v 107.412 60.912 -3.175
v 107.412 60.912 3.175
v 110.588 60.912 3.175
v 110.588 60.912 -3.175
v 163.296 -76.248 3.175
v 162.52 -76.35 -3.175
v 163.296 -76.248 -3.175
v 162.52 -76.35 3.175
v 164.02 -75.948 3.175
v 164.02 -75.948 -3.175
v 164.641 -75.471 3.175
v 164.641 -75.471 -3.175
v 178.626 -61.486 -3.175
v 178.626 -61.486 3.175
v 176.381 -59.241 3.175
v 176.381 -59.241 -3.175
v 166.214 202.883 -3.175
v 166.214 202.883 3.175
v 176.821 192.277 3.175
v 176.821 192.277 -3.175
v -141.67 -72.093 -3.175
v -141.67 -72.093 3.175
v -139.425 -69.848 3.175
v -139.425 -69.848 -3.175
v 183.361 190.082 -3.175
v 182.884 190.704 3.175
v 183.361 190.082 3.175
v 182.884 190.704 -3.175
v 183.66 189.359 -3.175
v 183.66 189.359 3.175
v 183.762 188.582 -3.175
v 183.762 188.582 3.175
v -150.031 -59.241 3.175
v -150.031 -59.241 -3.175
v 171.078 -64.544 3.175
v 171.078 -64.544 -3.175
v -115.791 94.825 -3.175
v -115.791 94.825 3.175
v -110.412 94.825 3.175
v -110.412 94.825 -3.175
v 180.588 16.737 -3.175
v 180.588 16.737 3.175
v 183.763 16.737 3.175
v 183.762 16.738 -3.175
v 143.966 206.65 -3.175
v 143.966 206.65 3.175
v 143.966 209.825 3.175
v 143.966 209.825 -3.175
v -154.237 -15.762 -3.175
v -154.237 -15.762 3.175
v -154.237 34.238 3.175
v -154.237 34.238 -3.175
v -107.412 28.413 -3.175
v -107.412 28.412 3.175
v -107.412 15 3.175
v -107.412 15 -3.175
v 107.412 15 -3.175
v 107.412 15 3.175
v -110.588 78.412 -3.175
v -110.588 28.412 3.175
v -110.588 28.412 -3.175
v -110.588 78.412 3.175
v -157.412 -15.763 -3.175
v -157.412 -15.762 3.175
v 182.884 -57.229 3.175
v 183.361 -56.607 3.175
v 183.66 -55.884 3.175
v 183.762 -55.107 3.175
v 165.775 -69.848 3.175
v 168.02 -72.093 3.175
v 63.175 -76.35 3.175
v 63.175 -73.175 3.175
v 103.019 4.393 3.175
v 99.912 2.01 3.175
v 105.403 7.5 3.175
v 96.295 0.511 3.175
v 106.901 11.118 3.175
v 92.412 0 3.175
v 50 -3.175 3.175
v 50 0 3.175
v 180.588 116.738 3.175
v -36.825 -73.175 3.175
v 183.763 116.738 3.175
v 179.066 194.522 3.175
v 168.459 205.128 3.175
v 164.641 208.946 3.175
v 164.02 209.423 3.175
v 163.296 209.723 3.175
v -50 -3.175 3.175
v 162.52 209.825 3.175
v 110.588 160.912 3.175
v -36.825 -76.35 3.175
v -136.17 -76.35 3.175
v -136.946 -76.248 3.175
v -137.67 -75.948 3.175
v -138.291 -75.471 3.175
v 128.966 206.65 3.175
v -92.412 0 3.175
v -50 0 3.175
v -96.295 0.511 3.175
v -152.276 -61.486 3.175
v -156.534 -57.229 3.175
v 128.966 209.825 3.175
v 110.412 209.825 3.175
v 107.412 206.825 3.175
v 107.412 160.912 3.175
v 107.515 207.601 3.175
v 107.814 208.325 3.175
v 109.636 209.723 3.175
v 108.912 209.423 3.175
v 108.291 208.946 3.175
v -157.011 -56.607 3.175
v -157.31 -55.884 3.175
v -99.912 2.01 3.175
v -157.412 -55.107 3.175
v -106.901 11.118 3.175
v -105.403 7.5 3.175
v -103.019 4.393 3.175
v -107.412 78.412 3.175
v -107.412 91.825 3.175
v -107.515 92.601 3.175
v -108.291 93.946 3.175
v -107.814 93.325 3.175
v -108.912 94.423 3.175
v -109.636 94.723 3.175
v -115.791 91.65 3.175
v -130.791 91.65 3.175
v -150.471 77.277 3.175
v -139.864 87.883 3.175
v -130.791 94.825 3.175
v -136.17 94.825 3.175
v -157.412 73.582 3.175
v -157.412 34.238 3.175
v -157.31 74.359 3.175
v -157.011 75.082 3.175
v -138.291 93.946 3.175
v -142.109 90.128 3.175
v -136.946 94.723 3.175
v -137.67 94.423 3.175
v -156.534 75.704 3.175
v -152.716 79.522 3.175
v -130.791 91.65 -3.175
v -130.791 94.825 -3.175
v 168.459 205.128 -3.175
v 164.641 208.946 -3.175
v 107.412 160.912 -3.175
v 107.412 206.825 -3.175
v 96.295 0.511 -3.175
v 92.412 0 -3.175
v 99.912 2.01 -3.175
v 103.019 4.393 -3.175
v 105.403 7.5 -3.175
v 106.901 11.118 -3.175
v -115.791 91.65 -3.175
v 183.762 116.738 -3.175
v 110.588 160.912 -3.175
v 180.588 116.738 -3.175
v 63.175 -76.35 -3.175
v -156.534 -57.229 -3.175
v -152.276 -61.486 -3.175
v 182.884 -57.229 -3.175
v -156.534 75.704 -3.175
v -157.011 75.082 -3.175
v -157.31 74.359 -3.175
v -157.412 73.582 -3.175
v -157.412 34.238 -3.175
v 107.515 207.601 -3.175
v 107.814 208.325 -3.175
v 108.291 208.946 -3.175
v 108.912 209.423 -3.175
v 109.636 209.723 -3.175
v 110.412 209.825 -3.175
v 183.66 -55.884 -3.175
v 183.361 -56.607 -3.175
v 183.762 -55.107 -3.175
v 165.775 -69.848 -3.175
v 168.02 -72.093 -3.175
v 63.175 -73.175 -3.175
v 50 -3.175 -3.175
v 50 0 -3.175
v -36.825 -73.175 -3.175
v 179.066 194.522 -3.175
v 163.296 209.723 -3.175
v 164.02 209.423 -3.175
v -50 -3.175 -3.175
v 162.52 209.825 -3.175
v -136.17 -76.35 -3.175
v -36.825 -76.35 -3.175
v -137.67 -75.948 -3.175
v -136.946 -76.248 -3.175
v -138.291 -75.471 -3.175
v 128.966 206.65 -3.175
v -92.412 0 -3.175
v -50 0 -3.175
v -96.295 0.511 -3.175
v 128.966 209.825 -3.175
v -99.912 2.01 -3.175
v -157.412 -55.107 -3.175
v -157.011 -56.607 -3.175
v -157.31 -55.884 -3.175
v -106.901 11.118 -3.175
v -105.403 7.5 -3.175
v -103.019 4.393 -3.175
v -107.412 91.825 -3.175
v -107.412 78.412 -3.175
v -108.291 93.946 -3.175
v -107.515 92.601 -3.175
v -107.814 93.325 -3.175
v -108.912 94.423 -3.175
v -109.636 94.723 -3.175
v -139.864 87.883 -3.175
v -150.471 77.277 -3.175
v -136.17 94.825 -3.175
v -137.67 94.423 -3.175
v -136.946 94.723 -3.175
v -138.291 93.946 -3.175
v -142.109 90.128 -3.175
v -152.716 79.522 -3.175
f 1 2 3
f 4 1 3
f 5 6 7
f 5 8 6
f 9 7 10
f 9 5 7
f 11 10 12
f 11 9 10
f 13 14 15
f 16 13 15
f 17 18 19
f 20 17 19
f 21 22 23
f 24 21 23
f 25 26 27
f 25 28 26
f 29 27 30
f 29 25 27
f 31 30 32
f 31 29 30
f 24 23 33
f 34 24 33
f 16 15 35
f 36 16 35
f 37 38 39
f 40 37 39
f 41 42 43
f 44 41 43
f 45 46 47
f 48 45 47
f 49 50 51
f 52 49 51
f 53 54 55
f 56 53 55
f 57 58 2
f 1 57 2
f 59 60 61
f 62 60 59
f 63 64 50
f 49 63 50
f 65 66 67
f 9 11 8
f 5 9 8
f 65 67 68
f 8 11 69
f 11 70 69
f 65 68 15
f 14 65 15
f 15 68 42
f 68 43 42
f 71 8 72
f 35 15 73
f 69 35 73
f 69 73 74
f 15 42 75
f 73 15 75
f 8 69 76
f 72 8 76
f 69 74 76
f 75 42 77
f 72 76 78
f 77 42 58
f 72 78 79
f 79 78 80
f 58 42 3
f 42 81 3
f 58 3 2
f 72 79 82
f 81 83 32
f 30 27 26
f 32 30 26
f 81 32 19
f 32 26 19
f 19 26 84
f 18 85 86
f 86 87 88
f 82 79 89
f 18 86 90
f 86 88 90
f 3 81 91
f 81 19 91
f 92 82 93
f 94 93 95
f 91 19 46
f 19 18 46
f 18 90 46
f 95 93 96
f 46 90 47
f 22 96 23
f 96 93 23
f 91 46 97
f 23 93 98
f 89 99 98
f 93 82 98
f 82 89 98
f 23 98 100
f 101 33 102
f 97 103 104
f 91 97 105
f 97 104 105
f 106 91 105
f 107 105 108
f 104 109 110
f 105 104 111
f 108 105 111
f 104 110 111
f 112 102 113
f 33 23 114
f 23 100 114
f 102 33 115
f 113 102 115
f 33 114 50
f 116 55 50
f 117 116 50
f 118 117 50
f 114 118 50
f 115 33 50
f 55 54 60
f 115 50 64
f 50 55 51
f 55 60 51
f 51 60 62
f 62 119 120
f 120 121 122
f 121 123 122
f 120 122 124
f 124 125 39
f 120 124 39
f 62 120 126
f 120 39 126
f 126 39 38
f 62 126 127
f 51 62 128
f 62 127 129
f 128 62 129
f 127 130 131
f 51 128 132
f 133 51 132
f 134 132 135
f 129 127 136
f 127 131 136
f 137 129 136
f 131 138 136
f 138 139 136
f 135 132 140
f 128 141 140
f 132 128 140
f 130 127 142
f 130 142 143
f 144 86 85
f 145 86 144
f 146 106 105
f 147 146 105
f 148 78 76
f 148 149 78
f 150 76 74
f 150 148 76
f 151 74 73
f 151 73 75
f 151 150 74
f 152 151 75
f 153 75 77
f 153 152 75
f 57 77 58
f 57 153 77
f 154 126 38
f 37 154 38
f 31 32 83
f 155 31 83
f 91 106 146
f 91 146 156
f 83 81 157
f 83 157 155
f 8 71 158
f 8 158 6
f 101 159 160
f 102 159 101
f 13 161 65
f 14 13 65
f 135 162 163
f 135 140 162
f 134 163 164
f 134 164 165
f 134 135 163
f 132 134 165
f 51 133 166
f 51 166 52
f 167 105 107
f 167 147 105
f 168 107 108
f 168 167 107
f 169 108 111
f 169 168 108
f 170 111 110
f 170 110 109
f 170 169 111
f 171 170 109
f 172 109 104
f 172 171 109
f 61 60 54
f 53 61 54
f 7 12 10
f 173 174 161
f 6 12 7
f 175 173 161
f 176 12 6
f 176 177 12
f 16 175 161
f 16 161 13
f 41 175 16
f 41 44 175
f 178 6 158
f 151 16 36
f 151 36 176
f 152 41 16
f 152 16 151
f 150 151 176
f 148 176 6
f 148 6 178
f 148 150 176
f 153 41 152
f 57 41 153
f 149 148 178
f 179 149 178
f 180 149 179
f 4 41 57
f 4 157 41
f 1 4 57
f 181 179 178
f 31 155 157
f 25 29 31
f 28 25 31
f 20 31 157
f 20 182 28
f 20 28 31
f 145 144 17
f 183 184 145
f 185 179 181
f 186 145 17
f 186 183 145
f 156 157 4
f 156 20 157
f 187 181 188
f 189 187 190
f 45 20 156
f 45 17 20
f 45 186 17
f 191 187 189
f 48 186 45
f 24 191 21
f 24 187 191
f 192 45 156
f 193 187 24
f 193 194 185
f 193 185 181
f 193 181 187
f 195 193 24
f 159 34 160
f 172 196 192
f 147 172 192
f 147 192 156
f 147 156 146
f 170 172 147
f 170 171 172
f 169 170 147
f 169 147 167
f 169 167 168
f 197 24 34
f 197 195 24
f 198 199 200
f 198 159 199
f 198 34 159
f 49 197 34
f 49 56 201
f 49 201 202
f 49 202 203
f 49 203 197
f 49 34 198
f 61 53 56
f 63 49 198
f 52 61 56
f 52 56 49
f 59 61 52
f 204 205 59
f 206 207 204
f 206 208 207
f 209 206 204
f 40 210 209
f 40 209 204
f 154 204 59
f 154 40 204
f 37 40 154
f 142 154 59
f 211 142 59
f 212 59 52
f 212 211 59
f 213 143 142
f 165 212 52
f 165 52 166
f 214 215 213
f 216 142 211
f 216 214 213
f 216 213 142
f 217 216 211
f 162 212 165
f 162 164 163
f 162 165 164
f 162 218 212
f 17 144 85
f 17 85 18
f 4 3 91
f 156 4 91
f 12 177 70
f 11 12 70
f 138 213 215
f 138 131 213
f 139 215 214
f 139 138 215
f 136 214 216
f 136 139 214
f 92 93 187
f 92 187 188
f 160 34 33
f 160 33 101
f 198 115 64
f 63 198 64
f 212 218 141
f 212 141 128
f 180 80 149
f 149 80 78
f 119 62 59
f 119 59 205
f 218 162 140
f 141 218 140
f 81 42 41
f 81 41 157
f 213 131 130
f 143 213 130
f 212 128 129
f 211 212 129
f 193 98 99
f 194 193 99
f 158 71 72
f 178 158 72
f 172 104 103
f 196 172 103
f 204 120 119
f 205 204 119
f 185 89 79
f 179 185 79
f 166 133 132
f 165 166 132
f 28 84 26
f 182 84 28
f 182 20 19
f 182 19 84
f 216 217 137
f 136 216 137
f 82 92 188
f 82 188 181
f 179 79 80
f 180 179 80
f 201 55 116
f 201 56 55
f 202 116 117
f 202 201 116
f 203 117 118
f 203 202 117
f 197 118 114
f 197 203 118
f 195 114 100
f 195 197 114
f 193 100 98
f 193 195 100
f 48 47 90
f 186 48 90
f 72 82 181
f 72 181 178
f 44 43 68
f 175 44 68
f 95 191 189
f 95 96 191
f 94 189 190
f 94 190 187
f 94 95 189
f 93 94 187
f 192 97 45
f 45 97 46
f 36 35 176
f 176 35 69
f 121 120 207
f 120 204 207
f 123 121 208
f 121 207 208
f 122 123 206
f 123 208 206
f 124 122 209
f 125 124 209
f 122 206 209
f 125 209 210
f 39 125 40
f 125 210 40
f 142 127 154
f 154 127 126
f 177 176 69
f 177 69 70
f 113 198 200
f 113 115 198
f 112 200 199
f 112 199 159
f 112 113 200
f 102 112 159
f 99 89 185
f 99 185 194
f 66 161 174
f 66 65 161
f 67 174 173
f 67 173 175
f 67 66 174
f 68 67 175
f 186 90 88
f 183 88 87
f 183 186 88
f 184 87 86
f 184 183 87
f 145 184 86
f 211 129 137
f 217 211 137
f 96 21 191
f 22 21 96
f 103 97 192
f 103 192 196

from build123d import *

# Parameters (mm, degrees)
BOSS_EXTRUDE1_DEPTH      = 3.175
BOSS_EXTRUDE1_DEPTH_BACK = 3.175
CHAMFER1_SIZE            = 20
FILLET1_R                = 15
FILLET2_R                = 3
SKETCH4_W                = 3.175
SKETCH4_H                = 50
SKETCH4_W_2              = 15
SKETCH4_H_2              = 3.175
SKETCH4_W_3              = 100
SKETCH4_H_3              = 100
WALL_SLOTS_DEPTH         = 60
FILLET3_R                = 3


with BuildPart() as part:
    # Sketch2 → Boss-Extrude1 (new body, two sides)
    with BuildSketch(Plane.XY) as boss_extrude1_sk:
        Polygon((-157.4125, 94.825), (-107.4125, 94.825), (-107.4125, 0), (107.4125, 0), (107.4125, 209.825), (183.7625, 209.825), (183.7625, -76.35), (58.275, -76.35), (-31.925, -76.35), (-157.4125, -76.35), align=None)
    extrude(amount=BOSS_EXTRUDE1_DEPTH)
    extrude(boss_extrude1_sk.sketch, amount=-BOSS_EXTRUDE1_DEPTH_BACK)

    # Chamfer1
    chamfer1_edges = [part.edges().sort_by_distance(p)[0] for p in [
        (-157.4125, 94.825, 0),
        (183.7625, 209.825, 0),
        (183.7625, -76.35, 0),
        (-157.4125, -76.35, 0),
    ]]
    chamfer(chamfer1_edges, length=CHAMFER1_SIZE)

    # Fillet1
    fillet1_edges = [part.edges().sort_by_distance(p)[0] for p in [
        (-107.4125, 0, 0),
        (107.4125, 0, 0),
    ]]
    fillet(fillet1_edges, radius=FILLET1_R)

    # Fillet2
    fillet2_edges = [part.edges().sort_by_distance(p)[0] for p in [
        (-107.4125, 94.825, 0),
        (107.4125, 209.825, 0),
        (-157.4125, 74.825, 0),
        (-157.4125, -56.35, 0),
        (183.7625, 189.825, 0),
        (183.7625, -56.35, 0),
        (163.7625, 209.825, 0),
        (-137.4125, 94.825, 0),
    ]]
    fillet(fillet2_edges, radius=FILLET2_R)

    # Sketch4 → wall_slots (cut)
    with BuildSketch(Plane.XY.offset(3.175)):
        with Locations((-109, 53.4125)):
            Rectangle(SKETCH4_W, SKETCH4_H)
        with Locations((-123.291179656, 93.2375)):
            Rectangle(SKETCH4_W_2, SKETCH4_H_2)
        Polygon((-142.109199141, 90.128300859), (-152.715800859, 79.521699141), (-150.470736829, 77.276635111), (-139.864135111, 87.883236829), align=None)
        with Locations((-155.825, 9.2375)):
            Rectangle(SKETCH4_W, SKETCH4_H)
        Polygon((-150.031397, -59.240974939), (-152.276461031, -61.486038969), (-141.669859313, -72.092640687), (-139.424795283, -69.847576657), align=None)
        with Locations((13.175, -74.7625)):
            Rectangle(SKETCH4_W_3, SKETCH4_H_2)
        with Locations((0, -1.5875)):
            Rectangle(SKETCH4_W_3, SKETCH4_H_2)
        Polygon((165.774795283, -69.847576657), (168.019859313, -72.092640687), (173.323160172, -66.789339828), (171.078096142, -64.544275798), align=None)
        Polygon((171.078096142, -64.544275798), (173.323160172, -66.789339828), (178.626461031, -61.486038969), (176.381397, -59.240974939), align=None)
        with Locations((182.175, 66.7375)):
            Rectangle(SKETCH4_W, SKETCH4_H_3)
        with Locations((109, 110.9125)):
            Rectangle(SKETCH4_W, SKETCH4_H_3)
        with Locations((136.466179656, 208.2375)):
            Rectangle(SKETCH4_W_2, SKETCH4_H_2)
        Polygon((179.065800859, 194.521699141), (168.459199141, 205.128300859), (166.214135111, 202.883236829), (176.820736829, 192.276635111), align=None)
    extrude(amount=-WALL_SLOTS_DEPTH, mode=Mode.SUBTRACT)

    # Fillet3
    fillet3_edges = [part.edges().sort_by_distance(p)[0] for p in [
        (163.7625, -76.35, 0),
        (-137.4125, -76.35, 0),
    ]]
    fillet(fillet3_edges, radius=FILLET3_R)


solid = part.part
